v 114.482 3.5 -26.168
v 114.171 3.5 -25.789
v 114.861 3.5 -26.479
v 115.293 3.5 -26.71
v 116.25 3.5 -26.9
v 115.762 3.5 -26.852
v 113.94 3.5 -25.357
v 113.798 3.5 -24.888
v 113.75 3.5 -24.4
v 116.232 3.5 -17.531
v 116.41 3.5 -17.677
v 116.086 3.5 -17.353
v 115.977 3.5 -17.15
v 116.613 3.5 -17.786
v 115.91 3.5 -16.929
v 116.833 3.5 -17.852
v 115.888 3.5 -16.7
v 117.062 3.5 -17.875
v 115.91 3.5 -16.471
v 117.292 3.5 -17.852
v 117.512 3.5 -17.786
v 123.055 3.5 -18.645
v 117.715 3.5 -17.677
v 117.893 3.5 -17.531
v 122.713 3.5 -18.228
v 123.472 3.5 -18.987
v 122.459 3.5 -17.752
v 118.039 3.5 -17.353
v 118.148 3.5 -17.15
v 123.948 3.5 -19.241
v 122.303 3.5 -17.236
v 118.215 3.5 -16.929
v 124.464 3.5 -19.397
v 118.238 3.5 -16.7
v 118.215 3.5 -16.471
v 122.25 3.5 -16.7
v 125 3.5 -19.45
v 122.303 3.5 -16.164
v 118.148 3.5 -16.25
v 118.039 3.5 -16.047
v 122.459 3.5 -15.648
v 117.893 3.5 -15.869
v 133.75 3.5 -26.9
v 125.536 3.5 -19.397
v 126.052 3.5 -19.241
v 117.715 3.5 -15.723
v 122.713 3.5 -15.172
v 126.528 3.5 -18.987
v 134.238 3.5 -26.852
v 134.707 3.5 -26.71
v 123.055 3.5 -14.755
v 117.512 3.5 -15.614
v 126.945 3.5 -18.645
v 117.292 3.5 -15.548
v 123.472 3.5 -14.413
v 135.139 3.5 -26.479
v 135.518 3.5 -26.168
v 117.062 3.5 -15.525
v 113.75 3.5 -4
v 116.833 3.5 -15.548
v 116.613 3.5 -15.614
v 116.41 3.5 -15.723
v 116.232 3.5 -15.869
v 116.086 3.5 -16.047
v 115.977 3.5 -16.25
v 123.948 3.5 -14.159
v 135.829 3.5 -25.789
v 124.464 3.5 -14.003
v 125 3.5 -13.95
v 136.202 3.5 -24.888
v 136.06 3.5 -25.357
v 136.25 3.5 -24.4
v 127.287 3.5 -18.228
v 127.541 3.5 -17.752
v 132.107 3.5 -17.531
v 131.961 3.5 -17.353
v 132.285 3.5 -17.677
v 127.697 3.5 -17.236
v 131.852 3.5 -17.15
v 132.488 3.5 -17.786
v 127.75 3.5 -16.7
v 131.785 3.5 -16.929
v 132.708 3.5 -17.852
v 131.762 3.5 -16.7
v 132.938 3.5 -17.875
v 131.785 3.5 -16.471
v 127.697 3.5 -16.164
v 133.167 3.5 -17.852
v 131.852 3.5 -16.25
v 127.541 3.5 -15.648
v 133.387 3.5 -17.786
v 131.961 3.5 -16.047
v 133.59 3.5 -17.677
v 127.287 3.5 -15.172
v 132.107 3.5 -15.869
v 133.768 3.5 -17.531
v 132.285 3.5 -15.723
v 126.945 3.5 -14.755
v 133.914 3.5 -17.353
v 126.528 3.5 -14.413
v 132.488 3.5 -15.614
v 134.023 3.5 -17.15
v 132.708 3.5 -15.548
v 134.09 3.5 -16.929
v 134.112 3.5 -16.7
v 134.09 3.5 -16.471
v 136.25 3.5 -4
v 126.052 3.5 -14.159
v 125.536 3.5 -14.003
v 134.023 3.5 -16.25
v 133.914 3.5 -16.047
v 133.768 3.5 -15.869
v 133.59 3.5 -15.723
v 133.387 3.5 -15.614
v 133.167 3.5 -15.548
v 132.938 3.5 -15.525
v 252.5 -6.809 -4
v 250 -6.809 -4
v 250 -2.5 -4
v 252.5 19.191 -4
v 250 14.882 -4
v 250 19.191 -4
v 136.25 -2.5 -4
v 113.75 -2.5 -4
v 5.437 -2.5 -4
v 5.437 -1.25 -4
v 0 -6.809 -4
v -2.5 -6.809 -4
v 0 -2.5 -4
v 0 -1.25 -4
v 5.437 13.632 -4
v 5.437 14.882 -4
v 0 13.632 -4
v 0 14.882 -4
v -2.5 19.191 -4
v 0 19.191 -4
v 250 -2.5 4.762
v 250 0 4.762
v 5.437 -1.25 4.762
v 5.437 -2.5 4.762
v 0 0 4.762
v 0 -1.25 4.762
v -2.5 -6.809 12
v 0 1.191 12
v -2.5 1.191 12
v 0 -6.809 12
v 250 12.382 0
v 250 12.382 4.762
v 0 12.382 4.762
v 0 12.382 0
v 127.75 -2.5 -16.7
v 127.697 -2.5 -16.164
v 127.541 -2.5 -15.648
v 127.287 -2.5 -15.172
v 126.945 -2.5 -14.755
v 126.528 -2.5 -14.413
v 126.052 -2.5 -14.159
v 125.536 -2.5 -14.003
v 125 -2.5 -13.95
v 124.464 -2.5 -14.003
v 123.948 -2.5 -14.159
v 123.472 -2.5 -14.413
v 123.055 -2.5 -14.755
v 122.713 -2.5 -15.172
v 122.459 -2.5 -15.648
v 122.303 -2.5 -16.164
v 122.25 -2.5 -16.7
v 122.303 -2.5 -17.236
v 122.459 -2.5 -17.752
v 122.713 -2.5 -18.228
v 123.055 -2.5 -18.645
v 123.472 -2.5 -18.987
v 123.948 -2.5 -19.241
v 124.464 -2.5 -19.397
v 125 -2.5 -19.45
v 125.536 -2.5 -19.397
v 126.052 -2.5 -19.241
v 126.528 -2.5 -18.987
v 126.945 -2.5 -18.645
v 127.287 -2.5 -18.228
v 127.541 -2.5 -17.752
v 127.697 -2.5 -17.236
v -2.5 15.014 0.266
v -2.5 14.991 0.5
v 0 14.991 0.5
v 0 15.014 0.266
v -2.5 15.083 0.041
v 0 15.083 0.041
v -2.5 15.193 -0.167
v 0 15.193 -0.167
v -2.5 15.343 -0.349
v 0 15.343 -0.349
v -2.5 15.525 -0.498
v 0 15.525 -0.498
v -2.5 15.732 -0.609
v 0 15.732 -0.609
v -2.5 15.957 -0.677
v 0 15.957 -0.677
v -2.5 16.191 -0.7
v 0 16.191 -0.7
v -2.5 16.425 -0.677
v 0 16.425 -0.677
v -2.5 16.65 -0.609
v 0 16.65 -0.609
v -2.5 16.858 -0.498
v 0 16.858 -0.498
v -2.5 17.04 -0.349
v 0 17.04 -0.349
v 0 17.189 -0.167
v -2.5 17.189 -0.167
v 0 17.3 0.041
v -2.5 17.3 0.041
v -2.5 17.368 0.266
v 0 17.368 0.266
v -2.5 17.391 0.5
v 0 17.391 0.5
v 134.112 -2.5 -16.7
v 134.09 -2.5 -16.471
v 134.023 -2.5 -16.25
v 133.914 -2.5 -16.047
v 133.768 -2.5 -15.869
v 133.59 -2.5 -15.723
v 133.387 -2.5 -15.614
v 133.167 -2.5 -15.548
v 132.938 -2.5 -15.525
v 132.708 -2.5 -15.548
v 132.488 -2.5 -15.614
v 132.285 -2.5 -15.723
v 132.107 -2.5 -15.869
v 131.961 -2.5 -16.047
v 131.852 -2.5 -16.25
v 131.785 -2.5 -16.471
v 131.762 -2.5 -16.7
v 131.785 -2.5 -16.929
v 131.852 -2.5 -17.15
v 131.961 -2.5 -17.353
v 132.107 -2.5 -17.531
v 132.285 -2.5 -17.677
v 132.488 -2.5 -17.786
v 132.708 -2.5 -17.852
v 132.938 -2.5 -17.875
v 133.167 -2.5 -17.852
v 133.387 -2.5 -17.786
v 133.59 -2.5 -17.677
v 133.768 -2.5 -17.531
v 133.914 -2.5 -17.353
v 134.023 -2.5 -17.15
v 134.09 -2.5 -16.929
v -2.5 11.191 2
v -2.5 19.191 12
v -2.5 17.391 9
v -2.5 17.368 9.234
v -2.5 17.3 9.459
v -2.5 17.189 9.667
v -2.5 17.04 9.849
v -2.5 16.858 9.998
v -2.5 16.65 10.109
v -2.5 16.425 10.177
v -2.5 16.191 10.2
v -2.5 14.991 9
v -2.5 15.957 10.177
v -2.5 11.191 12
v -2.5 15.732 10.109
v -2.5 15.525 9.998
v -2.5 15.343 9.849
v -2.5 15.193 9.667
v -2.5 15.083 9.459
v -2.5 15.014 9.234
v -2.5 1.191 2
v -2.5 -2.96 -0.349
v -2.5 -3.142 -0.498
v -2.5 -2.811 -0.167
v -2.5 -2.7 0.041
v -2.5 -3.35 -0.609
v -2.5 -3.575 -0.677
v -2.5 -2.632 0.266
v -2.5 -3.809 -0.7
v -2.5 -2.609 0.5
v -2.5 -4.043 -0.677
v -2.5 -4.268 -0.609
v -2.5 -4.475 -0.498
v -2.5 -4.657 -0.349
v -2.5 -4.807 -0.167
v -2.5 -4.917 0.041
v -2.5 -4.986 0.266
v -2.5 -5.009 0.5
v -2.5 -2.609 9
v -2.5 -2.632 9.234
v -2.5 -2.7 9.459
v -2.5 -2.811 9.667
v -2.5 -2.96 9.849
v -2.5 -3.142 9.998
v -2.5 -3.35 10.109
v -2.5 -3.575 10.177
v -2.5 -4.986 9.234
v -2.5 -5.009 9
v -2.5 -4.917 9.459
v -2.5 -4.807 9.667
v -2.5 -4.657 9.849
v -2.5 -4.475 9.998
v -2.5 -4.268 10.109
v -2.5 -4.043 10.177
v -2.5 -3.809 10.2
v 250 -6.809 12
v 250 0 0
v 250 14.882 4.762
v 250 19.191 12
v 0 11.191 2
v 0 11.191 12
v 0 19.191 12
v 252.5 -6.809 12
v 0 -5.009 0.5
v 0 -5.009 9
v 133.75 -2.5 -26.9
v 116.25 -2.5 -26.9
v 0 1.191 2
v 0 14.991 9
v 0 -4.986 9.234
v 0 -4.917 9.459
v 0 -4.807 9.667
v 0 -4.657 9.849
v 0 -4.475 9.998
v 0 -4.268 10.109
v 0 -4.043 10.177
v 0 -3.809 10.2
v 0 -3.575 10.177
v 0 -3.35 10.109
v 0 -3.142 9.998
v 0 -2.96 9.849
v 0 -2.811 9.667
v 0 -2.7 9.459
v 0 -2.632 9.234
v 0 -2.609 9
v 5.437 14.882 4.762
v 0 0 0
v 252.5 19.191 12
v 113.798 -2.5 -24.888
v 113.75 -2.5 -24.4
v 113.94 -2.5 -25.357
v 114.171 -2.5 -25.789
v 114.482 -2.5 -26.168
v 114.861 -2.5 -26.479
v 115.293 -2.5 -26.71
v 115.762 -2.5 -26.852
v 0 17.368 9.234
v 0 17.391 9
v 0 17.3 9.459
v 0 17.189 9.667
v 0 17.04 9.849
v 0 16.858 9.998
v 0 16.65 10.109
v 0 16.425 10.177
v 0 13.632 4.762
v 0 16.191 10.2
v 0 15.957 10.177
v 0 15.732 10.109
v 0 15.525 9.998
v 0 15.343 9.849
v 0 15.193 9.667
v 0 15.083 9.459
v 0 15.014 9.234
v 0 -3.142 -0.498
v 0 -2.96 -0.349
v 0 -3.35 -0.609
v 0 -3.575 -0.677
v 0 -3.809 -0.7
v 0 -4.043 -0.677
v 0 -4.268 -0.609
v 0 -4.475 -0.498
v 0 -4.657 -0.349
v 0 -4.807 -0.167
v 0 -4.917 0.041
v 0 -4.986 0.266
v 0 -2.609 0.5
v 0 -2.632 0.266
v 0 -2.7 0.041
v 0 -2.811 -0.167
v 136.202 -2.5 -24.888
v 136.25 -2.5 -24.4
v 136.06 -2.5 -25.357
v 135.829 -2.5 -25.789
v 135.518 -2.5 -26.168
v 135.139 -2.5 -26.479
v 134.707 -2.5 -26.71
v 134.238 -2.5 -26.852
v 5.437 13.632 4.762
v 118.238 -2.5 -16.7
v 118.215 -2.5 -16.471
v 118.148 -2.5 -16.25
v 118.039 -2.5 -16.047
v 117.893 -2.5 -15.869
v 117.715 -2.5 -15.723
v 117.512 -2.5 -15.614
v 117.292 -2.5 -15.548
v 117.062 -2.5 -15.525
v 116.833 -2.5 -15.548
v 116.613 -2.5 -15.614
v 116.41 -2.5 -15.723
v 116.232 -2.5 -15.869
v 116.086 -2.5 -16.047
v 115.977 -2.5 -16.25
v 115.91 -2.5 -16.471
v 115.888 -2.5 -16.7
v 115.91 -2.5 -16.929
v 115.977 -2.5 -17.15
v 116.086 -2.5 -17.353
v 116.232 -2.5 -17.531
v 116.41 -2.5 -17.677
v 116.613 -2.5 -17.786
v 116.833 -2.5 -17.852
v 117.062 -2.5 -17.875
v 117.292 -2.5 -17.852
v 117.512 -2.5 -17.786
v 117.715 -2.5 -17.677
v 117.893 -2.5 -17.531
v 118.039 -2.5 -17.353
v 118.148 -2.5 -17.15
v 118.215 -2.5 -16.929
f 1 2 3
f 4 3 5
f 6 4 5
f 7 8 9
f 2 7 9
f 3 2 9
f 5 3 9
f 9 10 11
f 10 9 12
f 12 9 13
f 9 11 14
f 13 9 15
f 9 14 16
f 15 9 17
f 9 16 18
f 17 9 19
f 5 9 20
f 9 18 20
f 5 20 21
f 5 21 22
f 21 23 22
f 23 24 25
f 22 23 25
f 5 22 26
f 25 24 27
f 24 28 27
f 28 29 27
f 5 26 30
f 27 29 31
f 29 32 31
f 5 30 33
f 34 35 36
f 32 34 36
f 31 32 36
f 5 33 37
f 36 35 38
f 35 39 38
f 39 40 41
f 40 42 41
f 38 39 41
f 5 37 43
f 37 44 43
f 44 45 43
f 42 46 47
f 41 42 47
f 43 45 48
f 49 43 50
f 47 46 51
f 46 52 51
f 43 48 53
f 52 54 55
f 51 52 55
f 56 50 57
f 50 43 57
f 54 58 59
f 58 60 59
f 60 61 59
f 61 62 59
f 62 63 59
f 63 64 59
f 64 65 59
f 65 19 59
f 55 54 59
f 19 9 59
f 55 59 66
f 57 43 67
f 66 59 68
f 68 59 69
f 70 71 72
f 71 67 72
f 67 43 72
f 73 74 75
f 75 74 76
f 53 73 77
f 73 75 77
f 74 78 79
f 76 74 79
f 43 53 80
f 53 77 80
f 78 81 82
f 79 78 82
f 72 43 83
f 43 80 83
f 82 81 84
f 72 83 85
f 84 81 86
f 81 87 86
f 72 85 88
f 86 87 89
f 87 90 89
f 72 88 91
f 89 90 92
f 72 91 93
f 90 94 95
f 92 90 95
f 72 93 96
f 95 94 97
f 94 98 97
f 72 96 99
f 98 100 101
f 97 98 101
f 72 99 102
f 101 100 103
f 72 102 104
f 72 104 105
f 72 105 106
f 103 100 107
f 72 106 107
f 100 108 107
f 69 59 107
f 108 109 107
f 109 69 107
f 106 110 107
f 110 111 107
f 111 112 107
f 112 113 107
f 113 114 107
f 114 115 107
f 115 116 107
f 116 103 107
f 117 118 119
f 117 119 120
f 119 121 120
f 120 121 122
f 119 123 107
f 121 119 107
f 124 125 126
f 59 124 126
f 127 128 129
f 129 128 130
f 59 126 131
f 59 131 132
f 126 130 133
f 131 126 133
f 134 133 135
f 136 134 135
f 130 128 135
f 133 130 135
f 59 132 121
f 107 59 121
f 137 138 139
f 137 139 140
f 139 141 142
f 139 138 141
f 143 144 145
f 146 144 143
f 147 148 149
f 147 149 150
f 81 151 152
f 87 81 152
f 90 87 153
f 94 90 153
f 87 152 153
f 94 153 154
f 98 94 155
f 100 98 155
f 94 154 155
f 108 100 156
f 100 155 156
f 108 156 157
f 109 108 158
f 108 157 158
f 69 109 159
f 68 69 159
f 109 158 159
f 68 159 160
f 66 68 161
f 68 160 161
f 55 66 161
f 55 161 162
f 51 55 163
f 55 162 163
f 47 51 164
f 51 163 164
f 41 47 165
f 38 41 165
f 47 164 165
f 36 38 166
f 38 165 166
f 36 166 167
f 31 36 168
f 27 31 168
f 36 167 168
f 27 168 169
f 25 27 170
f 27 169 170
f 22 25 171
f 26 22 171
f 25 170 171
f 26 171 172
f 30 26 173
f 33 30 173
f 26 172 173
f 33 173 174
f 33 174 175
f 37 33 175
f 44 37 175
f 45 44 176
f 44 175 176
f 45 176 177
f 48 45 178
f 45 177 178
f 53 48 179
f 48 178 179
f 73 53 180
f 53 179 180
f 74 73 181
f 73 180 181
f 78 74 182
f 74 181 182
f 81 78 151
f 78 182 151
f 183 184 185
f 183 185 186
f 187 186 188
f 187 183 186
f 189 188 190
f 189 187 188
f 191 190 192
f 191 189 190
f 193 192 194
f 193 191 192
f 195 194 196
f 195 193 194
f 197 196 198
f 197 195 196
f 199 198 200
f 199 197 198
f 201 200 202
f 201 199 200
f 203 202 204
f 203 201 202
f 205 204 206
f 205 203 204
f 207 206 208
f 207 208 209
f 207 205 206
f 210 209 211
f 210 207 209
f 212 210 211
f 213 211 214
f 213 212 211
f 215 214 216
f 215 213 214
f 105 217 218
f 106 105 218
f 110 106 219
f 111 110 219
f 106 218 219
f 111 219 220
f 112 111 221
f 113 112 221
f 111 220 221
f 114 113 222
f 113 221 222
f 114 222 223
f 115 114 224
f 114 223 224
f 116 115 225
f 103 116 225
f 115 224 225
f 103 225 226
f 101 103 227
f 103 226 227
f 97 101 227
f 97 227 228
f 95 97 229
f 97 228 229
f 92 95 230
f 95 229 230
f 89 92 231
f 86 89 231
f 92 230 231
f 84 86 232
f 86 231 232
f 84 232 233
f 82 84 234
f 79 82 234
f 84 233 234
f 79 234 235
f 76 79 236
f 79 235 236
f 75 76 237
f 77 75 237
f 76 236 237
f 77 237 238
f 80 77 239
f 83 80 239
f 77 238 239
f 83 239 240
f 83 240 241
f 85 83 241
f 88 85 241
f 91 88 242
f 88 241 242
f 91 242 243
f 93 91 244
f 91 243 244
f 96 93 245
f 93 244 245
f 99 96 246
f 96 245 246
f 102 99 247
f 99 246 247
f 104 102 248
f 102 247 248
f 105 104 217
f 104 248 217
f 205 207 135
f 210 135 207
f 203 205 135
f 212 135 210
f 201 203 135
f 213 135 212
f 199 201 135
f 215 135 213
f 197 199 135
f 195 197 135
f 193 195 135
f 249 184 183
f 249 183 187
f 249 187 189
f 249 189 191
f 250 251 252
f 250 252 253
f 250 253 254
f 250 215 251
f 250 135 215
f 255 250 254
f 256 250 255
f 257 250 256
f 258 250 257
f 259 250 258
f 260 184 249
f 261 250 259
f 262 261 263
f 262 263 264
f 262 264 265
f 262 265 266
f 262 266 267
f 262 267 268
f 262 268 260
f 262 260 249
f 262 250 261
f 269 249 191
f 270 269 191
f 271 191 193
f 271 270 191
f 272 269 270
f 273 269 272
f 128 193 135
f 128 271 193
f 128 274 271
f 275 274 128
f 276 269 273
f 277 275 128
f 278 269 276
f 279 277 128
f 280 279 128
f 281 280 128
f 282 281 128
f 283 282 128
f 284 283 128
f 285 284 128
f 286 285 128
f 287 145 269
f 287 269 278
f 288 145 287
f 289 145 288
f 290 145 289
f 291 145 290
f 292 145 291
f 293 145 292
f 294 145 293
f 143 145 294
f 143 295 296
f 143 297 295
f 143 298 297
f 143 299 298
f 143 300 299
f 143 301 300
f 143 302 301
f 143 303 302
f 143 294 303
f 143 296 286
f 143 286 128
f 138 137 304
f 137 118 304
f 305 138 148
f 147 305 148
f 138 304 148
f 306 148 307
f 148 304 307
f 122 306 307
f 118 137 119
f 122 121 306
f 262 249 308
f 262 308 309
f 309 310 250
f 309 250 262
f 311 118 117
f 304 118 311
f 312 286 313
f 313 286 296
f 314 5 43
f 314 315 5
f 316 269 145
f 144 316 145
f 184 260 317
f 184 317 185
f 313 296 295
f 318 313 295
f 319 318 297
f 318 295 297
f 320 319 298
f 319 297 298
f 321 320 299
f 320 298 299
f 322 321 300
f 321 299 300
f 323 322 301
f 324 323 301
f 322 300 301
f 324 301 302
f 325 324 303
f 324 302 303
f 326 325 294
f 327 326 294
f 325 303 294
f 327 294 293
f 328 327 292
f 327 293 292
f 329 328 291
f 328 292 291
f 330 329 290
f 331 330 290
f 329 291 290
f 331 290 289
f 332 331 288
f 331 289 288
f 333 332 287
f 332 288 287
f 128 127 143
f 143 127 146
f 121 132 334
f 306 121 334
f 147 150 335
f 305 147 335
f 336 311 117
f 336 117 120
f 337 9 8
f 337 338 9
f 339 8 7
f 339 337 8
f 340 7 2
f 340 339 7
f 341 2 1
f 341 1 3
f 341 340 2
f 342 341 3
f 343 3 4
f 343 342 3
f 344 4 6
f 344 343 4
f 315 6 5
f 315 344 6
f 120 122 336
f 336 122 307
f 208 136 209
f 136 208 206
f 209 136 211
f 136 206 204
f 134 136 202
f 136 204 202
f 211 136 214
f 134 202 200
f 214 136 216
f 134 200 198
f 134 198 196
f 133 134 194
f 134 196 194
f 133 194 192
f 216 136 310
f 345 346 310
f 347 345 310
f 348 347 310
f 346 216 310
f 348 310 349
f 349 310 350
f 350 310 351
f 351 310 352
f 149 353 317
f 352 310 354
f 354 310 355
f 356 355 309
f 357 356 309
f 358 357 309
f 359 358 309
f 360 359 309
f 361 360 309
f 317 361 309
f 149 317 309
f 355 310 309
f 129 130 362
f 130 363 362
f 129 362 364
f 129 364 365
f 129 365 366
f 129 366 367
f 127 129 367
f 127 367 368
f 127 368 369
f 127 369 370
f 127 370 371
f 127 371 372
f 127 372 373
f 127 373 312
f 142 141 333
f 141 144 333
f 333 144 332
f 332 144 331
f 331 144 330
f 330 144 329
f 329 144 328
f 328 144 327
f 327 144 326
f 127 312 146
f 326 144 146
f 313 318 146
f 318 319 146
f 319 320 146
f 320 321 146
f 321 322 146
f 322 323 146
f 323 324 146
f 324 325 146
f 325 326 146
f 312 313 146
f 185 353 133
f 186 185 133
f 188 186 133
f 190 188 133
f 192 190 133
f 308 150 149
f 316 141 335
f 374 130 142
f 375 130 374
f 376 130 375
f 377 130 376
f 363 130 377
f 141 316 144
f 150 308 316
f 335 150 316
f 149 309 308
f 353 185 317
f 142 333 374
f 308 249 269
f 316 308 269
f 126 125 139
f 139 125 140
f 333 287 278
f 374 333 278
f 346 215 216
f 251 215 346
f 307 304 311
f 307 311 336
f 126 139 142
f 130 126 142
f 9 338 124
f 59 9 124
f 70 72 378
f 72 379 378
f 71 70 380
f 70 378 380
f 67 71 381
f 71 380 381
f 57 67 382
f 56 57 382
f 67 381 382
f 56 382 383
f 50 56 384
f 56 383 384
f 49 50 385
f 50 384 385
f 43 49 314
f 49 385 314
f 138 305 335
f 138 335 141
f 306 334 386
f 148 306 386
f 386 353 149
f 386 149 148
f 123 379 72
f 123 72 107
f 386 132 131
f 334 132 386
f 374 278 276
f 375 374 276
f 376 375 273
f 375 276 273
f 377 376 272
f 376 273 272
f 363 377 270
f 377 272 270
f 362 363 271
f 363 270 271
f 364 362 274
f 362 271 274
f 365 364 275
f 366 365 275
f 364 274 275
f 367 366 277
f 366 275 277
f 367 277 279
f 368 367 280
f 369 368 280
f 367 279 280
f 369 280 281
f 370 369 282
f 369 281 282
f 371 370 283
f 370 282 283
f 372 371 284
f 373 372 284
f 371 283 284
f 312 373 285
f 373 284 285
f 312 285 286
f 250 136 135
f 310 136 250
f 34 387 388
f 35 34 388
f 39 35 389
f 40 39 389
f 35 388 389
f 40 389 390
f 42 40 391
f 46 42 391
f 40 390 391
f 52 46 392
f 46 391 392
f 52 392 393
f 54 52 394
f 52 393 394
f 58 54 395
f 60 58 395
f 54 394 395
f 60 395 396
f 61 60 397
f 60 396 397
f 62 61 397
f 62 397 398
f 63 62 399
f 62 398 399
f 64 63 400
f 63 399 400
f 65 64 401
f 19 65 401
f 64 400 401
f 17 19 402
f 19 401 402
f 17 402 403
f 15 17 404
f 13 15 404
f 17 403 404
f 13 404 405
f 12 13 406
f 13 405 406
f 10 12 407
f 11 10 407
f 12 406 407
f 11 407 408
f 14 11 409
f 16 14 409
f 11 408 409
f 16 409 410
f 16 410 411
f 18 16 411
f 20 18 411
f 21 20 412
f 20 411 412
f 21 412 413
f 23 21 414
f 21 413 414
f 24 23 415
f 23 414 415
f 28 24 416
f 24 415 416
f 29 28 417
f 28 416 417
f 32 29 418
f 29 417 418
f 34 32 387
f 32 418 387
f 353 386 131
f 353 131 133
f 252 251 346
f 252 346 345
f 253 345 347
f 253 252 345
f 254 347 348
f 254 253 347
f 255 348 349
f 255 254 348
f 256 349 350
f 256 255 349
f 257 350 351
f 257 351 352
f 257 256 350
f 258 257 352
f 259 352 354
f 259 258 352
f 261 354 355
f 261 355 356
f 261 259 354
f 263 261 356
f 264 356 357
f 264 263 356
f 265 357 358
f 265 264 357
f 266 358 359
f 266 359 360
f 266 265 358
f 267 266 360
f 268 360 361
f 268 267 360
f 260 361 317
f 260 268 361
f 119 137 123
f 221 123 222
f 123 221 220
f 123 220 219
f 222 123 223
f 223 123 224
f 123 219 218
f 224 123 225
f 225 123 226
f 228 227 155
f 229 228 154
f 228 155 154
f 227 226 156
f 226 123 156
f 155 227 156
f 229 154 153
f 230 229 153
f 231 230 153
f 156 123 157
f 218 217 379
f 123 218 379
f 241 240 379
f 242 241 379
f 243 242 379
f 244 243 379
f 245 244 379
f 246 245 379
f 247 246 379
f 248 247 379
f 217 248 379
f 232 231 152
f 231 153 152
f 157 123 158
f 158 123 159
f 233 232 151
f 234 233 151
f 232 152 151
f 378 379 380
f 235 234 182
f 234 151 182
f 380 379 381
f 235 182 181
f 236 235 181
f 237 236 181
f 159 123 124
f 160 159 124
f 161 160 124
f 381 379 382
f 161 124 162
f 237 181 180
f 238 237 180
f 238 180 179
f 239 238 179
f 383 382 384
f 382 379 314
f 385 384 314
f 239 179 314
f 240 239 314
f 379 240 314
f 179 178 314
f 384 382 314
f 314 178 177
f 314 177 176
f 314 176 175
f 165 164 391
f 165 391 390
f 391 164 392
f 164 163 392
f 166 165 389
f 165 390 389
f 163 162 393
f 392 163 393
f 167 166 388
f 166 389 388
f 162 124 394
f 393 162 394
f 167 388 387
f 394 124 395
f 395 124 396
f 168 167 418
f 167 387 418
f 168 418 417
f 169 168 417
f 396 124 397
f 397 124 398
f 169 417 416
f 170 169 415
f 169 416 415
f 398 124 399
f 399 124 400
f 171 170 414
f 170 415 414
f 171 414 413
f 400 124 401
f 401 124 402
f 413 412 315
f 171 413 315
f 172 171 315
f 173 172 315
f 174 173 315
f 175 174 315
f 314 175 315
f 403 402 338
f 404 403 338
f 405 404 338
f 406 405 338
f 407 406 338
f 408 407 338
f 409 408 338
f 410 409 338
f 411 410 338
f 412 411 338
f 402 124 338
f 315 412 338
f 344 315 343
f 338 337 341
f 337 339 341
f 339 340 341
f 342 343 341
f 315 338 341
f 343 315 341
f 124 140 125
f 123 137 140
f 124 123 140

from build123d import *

# Parameters (mm, degrees)
BOSS_EXTRUDE1_DEPTH = 250
SKETCH16_W          = 22.5
SKETCH16_H          = 25.4
SKETCH16_R          = 1.175
SKETCH16_R_2        = 2.75
BOSS_EXTRUDE4_DEPTH = 6
SKETCH17_W          = 22.5
SKETCH17_H          = 6
CUT_EXTRUDE10_DEPTH = 2.5
SKETCH20_W          = 26
SKETCH20_H          = 16
BOSS_EXTRUDE7_DEPTH = 2.5
CUT_EXTRUDE12_DEPTH = 2.5
SKETCH22_W          = 10
SKETCH22_H          = 10
CUT_EXTRUDE13_DEPTH = 10
SKETCH23_W          = 5.437321705
SKETCH23_H          = 8.7625
CUT_EXTRUDE14_DEPTH = 1.25
SKETCH24_W          = 26
SKETCH24_H          = 16
BOSS_EXTRUDE8_DEPTH = 2.5
FILLET1_R           = 2.5


with BuildPart() as part:
    # Sketch1 → Boss-Extrude1 (new body)
    with BuildSketch(Plane.YZ):
        Polygon((0, 4.7625), (-2.5, 4.7625), (-2.5, -4), (14.8825, -4), (14.8825, 4.7625), (12.3825, 4.7625), (12.3825, 0), (0, 0), align=None)
    extrude(amount=BOSS_EXTRUDE1_DEPTH)

    # Sketch16 → Boss-Extrude4 (add)
    with BuildSketch(Plane.XZ.offset(2.5)):
        with Locations((125, -16.7)):
            Rectangle(SKETCH16_W, SKETCH16_H)
        with Locations((117.0625, -16.7)):
            Circle(SKETCH16_R, mode=Mode.SUBTRACT)
        with Locations((132.9375, -16.7)):
            Circle(SKETCH16_R, mode=Mode.SUBTRACT)
        with Locations((125, -16.7)):
            Circle(SKETCH16_R_2, mode=Mode.SUBTRACT)
    extrude(amount=-BOSS_EXTRUDE4_DEPTH)

    # Sketch17 → Cut-Extrude10 (cut)
    with BuildSketch(Plane(origin=(0, 0, -29.4), x_dir=(1, 0, 0), z_dir=(0, 0, -1))):
        with Locations((125, -0.5)):
            Rectangle(SKETCH17_W, SKETCH17_H)
    extrude(amount=-CUT_EXTRUDE10_DEPTH, mode=Mode.SUBTRACT)

    # Sketch20 → Boss-Extrude7 (add)
    with BuildSketch(Plane(origin=(0, 0, 0), x_dir=(0, -1, 0), z_dir=(-1, 0, 0))):
        with Locations((-6.19125, 4)):
            Rectangle(SKETCH20_W, SKETCH20_H)
    extrude(amount=BOSS_EXTRUDE7_DEPTH)

    # Sketch21 → Cut-Extrude12 (cut)
    with BuildSketch(Plane(origin=(-2.5, 0, 0), x_dir=(0, -1, 0), z_dir=(-1, 0, 0))):
        with BuildLine():
            Line((-14.99125, 9), (-14.99125, 0.5))
            ThreePointArc((-14.99125, 0.5), (-16.19125, -0.7), (-17.39125, 0.5))
            Line((-17.39125, 0.5), (-17.39125, 9))
            ThreePointArc((-17.39125, 9), (-16.19125, 10.2), (-14.99125, 9))
        make_face()
        with BuildLine():
            Line((2.60875, 9), (2.60875, 0.5))
            ThreePointArc((2.60875, 0.5), (3.80875, -0.7), (5.00875, 0.5))
            Line((5.00875, 0.5), (5.00875, 9))
            ThreePointArc((5.00875, 9), (3.80875, 10.2), (2.60875, 9))
        make_face()
    extrude(amount=-CUT_EXTRUDE12_DEPTH, mode=Mode.SUBTRACT)

    # Sketch22 → Cut-Extrude13 (cut)
    with BuildSketch(Plane(origin=(-2.5, 0, 0), x_dir=(0, -1, 0), z_dir=(-1, 0, 0))):
        with Locations((-6.19125, 7)):
            Rectangle(SKETCH22_W, SKETCH22_H)
    extrude(amount=-CUT_EXTRUDE13_DEPTH, mode=Mode.SUBTRACT)

    # Sketch23 → Cut-Extrude14 (cut)
    with BuildSketch(Plane(origin=(0, 14.8825, 0), x_dir=(-1, 0, 0), z_dir=(0, 1, 0))):
        with Locations((-2.718660853, 0.38125)):
            Rectangle(SKETCH23_W, SKETCH23_H)
    cut_extrude14 = extrude(amount=-CUT_EXTRUDE14_DEPTH, mode=Mode.SUBTRACT)

    # Mirror8: Cut-Extrude14 across plane
    add(cut_extrude14.mirror(Plane.ZX.offset(6.19125)), mode=Mode.SUBTRACT)

    # Sketch24 → Boss-Extrude8 (add)
    with BuildSketch(Plane.YZ.offset(250)):
        with Locations((6.19125, 4)):
            Rectangle(SKETCH24_W, SKETCH24_H)
    extrude(amount=BOSS_EXTRUDE8_DEPTH)

    # Fillet1
    fillet1_edges = [part.edges().sort_by_distance(p)[0] for p in [
        (136.25, 0.5, -26.9),
        (113.75, 0.5, -26.9),
    ]]
    fillet(fillet1_edges, radius=FILLET1_R)


solid = part.part
